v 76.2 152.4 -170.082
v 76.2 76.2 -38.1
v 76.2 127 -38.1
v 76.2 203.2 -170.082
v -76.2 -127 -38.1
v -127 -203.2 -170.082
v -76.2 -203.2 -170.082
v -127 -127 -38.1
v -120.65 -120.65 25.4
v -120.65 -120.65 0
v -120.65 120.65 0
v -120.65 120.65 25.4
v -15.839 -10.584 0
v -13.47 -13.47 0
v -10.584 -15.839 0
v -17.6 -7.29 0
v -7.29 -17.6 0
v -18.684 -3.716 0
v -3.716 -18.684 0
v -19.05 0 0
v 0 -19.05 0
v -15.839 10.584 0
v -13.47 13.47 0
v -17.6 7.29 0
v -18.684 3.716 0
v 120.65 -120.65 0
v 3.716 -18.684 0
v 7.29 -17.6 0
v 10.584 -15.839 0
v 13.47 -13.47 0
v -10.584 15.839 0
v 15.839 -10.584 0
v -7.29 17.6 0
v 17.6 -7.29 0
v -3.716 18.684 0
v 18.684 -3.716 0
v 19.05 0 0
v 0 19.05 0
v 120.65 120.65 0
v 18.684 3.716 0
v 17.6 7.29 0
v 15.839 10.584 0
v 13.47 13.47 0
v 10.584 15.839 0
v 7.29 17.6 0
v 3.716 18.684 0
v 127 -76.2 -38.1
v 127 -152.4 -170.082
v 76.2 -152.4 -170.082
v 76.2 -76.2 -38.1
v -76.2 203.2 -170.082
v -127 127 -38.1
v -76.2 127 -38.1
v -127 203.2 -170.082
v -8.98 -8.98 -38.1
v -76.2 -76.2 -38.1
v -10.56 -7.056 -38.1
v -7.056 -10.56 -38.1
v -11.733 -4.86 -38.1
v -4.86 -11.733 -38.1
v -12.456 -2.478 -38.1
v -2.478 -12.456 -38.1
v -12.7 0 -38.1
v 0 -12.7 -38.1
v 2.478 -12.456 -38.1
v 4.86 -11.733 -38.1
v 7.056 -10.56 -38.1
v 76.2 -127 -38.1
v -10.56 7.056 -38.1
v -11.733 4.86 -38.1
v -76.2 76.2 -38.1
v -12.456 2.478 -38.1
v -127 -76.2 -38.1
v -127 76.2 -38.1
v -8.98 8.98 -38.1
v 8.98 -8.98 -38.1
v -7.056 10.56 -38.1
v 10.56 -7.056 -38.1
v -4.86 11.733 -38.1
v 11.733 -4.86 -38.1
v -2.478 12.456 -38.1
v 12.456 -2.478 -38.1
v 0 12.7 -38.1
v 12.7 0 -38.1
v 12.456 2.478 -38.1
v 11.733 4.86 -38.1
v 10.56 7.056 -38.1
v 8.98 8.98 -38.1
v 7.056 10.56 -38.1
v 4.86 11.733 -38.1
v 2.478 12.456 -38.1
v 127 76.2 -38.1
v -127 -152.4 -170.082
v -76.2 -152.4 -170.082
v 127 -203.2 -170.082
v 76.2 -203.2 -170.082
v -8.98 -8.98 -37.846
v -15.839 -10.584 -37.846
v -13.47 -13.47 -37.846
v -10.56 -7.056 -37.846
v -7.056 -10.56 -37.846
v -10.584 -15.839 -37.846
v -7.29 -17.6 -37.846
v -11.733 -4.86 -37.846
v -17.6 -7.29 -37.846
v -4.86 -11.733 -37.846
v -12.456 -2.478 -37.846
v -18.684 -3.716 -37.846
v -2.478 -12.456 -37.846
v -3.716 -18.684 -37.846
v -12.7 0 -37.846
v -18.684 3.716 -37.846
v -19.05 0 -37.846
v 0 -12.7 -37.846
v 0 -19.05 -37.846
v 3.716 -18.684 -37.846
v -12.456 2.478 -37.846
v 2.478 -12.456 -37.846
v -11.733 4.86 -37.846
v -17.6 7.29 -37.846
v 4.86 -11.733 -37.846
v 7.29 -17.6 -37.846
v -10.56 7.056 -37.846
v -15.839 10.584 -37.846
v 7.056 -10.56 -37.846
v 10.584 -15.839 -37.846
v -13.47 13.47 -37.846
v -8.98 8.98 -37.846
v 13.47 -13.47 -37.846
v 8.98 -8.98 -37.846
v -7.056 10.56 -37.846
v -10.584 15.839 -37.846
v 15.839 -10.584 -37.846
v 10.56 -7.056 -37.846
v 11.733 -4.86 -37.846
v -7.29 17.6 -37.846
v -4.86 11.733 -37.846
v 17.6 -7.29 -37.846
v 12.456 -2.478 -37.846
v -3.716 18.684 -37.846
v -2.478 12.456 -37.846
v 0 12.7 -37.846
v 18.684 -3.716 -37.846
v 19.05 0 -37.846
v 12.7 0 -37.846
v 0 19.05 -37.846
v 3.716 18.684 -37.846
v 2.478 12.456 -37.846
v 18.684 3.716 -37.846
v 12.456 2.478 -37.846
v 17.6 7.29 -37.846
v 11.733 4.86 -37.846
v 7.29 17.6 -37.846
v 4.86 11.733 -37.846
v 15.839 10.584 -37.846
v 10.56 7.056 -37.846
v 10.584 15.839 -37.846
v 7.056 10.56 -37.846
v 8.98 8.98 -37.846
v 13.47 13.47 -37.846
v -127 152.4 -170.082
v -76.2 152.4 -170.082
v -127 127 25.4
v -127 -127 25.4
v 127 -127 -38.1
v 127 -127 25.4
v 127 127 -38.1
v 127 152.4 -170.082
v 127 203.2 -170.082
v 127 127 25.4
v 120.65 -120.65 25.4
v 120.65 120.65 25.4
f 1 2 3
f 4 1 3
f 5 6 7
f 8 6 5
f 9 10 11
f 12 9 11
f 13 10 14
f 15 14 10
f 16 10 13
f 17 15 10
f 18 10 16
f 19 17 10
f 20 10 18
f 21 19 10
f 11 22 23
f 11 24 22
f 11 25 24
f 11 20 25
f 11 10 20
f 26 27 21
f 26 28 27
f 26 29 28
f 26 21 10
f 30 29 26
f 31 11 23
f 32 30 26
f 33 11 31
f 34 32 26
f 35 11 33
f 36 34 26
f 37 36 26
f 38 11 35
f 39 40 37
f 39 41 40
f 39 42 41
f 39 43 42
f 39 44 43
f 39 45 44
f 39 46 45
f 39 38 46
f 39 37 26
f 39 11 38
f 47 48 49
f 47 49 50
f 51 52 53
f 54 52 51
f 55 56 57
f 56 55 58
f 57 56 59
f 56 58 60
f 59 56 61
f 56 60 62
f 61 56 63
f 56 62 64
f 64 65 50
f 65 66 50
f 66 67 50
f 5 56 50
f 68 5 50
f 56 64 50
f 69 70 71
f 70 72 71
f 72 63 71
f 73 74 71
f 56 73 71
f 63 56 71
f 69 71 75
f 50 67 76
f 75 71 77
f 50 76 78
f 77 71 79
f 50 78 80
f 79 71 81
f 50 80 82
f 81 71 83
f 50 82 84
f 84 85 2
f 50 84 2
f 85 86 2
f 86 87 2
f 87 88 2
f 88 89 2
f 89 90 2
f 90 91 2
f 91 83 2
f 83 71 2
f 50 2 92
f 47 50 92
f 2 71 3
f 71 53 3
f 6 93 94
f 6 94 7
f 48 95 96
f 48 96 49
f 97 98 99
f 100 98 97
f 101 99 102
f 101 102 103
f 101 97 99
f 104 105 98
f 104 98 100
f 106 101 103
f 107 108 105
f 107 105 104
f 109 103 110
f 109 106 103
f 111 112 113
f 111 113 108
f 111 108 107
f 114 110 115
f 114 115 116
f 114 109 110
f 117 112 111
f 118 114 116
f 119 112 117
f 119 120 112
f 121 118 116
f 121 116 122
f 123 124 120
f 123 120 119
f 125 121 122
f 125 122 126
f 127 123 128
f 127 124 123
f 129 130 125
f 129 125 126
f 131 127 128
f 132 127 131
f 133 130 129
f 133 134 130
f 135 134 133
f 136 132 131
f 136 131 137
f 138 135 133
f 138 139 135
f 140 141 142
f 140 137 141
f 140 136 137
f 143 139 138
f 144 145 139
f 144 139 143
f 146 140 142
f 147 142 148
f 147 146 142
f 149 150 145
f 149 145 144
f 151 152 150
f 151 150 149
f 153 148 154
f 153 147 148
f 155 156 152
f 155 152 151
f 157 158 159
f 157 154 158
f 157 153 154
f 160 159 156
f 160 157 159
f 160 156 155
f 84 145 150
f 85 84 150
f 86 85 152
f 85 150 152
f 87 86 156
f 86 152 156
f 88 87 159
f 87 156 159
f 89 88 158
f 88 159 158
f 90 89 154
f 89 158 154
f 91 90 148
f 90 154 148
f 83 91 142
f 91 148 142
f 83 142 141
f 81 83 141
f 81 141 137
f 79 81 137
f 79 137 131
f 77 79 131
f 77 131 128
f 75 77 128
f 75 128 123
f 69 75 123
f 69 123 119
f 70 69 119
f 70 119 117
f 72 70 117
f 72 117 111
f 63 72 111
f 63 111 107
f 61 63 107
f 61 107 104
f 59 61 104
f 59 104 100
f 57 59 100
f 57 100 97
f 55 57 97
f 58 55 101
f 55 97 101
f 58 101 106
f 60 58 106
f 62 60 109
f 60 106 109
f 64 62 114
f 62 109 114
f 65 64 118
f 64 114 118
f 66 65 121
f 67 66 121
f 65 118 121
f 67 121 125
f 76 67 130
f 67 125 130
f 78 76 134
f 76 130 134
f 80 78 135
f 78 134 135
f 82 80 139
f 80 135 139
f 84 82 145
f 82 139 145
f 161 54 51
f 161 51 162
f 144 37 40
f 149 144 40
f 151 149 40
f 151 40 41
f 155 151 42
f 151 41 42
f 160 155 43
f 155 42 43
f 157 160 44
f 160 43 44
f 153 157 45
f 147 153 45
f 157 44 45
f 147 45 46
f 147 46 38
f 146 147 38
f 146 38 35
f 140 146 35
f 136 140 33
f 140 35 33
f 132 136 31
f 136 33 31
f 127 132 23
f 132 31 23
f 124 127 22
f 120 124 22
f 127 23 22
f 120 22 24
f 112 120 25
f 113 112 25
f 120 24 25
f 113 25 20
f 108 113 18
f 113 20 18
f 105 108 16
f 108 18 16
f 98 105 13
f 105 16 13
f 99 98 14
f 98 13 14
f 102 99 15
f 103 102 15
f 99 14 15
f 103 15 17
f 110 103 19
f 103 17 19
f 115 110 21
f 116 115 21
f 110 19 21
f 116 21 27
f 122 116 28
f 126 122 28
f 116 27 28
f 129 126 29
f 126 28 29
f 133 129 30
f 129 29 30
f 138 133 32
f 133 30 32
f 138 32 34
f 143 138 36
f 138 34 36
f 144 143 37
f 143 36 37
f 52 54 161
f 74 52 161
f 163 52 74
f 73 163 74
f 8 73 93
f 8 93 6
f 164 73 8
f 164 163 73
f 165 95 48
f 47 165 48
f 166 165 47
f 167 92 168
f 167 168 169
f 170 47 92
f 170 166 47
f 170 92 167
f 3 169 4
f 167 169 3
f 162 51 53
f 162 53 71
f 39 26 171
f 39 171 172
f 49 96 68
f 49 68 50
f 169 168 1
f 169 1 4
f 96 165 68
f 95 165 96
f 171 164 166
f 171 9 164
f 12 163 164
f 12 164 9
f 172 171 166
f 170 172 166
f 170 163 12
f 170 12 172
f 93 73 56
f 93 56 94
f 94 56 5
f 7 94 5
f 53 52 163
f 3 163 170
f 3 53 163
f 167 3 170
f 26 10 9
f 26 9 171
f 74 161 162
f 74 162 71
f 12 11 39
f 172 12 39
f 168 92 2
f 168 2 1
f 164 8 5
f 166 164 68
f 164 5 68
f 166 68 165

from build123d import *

# Parameters (mm, degrees)
F0_W     = 254
F0_H     = 254
F0_R     = 12.7
F1_DEPTH = 38.1
F2_W     = 254
F2_H     = 254
F2_W_2   = 241.3
F2_H_2   = 241.3
F3_DEPTH = 25.4
F4_R     = 19.05
F5_DEPTH = 37.846
F7_DEPTH = 50.8
F9_DEPTH = 50.8


with BuildPart() as f1:
    # F0 (on Top) → F1 (new body)
    with BuildSketch(Plane.XY):
        Rectangle(F0_W, F0_H)
        Circle(F0_R, mode=Mode.SUBTRACT)
    extrude(amount=-F1_DEPTH)

    # F2 (on face) → F3 (join)
    with BuildSketch(Plane.XY):
        Rectangle(F2_W, F2_H)
        Rectangle(F2_W_2, F2_H_2, mode=Mode.SUBTRACT)
    extrude(amount=F3_DEPTH)

    # F4 (on face) → F5 (cut)
    with BuildSketch(Plane.XY):
        Circle(F4_R)
    extrude(amount=-F5_DEPTH, mode=Mode.SUBTRACT)

    # F6 (on face) → F7 (join)
    with BuildSketch(Plane.YZ.offset(127)):
        Polygon((203.2, -170.082272), (127, -38.1), (76.2, -38.1), (152.4, -170.082272), align=None)
        Polygon((-76.2, -38.1), (-127, -38.1), (-203.2, -170.082272), (-152.4, -170.082272), align=None)
    extrude(amount=-F7_DEPTH)

    # F8 (on face) → F9 (join)
    with BuildSketch(Plane(origin=(-127, 0, 0), x_dir=(0, -1, 0), z_dir=(-1, 0, 0))):
        Polygon((-76.2, -38.1), (-127, -38.1), (-203.2, -170.082272), (-152.4, -170.082272), align=None)
        Polygon((203.2, -170.082272), (127, -38.1), (76.2, -38.1), (152.4, -170.082272), align=None)
    extrude(amount=-F9_DEPTH)


solid = f1.part
